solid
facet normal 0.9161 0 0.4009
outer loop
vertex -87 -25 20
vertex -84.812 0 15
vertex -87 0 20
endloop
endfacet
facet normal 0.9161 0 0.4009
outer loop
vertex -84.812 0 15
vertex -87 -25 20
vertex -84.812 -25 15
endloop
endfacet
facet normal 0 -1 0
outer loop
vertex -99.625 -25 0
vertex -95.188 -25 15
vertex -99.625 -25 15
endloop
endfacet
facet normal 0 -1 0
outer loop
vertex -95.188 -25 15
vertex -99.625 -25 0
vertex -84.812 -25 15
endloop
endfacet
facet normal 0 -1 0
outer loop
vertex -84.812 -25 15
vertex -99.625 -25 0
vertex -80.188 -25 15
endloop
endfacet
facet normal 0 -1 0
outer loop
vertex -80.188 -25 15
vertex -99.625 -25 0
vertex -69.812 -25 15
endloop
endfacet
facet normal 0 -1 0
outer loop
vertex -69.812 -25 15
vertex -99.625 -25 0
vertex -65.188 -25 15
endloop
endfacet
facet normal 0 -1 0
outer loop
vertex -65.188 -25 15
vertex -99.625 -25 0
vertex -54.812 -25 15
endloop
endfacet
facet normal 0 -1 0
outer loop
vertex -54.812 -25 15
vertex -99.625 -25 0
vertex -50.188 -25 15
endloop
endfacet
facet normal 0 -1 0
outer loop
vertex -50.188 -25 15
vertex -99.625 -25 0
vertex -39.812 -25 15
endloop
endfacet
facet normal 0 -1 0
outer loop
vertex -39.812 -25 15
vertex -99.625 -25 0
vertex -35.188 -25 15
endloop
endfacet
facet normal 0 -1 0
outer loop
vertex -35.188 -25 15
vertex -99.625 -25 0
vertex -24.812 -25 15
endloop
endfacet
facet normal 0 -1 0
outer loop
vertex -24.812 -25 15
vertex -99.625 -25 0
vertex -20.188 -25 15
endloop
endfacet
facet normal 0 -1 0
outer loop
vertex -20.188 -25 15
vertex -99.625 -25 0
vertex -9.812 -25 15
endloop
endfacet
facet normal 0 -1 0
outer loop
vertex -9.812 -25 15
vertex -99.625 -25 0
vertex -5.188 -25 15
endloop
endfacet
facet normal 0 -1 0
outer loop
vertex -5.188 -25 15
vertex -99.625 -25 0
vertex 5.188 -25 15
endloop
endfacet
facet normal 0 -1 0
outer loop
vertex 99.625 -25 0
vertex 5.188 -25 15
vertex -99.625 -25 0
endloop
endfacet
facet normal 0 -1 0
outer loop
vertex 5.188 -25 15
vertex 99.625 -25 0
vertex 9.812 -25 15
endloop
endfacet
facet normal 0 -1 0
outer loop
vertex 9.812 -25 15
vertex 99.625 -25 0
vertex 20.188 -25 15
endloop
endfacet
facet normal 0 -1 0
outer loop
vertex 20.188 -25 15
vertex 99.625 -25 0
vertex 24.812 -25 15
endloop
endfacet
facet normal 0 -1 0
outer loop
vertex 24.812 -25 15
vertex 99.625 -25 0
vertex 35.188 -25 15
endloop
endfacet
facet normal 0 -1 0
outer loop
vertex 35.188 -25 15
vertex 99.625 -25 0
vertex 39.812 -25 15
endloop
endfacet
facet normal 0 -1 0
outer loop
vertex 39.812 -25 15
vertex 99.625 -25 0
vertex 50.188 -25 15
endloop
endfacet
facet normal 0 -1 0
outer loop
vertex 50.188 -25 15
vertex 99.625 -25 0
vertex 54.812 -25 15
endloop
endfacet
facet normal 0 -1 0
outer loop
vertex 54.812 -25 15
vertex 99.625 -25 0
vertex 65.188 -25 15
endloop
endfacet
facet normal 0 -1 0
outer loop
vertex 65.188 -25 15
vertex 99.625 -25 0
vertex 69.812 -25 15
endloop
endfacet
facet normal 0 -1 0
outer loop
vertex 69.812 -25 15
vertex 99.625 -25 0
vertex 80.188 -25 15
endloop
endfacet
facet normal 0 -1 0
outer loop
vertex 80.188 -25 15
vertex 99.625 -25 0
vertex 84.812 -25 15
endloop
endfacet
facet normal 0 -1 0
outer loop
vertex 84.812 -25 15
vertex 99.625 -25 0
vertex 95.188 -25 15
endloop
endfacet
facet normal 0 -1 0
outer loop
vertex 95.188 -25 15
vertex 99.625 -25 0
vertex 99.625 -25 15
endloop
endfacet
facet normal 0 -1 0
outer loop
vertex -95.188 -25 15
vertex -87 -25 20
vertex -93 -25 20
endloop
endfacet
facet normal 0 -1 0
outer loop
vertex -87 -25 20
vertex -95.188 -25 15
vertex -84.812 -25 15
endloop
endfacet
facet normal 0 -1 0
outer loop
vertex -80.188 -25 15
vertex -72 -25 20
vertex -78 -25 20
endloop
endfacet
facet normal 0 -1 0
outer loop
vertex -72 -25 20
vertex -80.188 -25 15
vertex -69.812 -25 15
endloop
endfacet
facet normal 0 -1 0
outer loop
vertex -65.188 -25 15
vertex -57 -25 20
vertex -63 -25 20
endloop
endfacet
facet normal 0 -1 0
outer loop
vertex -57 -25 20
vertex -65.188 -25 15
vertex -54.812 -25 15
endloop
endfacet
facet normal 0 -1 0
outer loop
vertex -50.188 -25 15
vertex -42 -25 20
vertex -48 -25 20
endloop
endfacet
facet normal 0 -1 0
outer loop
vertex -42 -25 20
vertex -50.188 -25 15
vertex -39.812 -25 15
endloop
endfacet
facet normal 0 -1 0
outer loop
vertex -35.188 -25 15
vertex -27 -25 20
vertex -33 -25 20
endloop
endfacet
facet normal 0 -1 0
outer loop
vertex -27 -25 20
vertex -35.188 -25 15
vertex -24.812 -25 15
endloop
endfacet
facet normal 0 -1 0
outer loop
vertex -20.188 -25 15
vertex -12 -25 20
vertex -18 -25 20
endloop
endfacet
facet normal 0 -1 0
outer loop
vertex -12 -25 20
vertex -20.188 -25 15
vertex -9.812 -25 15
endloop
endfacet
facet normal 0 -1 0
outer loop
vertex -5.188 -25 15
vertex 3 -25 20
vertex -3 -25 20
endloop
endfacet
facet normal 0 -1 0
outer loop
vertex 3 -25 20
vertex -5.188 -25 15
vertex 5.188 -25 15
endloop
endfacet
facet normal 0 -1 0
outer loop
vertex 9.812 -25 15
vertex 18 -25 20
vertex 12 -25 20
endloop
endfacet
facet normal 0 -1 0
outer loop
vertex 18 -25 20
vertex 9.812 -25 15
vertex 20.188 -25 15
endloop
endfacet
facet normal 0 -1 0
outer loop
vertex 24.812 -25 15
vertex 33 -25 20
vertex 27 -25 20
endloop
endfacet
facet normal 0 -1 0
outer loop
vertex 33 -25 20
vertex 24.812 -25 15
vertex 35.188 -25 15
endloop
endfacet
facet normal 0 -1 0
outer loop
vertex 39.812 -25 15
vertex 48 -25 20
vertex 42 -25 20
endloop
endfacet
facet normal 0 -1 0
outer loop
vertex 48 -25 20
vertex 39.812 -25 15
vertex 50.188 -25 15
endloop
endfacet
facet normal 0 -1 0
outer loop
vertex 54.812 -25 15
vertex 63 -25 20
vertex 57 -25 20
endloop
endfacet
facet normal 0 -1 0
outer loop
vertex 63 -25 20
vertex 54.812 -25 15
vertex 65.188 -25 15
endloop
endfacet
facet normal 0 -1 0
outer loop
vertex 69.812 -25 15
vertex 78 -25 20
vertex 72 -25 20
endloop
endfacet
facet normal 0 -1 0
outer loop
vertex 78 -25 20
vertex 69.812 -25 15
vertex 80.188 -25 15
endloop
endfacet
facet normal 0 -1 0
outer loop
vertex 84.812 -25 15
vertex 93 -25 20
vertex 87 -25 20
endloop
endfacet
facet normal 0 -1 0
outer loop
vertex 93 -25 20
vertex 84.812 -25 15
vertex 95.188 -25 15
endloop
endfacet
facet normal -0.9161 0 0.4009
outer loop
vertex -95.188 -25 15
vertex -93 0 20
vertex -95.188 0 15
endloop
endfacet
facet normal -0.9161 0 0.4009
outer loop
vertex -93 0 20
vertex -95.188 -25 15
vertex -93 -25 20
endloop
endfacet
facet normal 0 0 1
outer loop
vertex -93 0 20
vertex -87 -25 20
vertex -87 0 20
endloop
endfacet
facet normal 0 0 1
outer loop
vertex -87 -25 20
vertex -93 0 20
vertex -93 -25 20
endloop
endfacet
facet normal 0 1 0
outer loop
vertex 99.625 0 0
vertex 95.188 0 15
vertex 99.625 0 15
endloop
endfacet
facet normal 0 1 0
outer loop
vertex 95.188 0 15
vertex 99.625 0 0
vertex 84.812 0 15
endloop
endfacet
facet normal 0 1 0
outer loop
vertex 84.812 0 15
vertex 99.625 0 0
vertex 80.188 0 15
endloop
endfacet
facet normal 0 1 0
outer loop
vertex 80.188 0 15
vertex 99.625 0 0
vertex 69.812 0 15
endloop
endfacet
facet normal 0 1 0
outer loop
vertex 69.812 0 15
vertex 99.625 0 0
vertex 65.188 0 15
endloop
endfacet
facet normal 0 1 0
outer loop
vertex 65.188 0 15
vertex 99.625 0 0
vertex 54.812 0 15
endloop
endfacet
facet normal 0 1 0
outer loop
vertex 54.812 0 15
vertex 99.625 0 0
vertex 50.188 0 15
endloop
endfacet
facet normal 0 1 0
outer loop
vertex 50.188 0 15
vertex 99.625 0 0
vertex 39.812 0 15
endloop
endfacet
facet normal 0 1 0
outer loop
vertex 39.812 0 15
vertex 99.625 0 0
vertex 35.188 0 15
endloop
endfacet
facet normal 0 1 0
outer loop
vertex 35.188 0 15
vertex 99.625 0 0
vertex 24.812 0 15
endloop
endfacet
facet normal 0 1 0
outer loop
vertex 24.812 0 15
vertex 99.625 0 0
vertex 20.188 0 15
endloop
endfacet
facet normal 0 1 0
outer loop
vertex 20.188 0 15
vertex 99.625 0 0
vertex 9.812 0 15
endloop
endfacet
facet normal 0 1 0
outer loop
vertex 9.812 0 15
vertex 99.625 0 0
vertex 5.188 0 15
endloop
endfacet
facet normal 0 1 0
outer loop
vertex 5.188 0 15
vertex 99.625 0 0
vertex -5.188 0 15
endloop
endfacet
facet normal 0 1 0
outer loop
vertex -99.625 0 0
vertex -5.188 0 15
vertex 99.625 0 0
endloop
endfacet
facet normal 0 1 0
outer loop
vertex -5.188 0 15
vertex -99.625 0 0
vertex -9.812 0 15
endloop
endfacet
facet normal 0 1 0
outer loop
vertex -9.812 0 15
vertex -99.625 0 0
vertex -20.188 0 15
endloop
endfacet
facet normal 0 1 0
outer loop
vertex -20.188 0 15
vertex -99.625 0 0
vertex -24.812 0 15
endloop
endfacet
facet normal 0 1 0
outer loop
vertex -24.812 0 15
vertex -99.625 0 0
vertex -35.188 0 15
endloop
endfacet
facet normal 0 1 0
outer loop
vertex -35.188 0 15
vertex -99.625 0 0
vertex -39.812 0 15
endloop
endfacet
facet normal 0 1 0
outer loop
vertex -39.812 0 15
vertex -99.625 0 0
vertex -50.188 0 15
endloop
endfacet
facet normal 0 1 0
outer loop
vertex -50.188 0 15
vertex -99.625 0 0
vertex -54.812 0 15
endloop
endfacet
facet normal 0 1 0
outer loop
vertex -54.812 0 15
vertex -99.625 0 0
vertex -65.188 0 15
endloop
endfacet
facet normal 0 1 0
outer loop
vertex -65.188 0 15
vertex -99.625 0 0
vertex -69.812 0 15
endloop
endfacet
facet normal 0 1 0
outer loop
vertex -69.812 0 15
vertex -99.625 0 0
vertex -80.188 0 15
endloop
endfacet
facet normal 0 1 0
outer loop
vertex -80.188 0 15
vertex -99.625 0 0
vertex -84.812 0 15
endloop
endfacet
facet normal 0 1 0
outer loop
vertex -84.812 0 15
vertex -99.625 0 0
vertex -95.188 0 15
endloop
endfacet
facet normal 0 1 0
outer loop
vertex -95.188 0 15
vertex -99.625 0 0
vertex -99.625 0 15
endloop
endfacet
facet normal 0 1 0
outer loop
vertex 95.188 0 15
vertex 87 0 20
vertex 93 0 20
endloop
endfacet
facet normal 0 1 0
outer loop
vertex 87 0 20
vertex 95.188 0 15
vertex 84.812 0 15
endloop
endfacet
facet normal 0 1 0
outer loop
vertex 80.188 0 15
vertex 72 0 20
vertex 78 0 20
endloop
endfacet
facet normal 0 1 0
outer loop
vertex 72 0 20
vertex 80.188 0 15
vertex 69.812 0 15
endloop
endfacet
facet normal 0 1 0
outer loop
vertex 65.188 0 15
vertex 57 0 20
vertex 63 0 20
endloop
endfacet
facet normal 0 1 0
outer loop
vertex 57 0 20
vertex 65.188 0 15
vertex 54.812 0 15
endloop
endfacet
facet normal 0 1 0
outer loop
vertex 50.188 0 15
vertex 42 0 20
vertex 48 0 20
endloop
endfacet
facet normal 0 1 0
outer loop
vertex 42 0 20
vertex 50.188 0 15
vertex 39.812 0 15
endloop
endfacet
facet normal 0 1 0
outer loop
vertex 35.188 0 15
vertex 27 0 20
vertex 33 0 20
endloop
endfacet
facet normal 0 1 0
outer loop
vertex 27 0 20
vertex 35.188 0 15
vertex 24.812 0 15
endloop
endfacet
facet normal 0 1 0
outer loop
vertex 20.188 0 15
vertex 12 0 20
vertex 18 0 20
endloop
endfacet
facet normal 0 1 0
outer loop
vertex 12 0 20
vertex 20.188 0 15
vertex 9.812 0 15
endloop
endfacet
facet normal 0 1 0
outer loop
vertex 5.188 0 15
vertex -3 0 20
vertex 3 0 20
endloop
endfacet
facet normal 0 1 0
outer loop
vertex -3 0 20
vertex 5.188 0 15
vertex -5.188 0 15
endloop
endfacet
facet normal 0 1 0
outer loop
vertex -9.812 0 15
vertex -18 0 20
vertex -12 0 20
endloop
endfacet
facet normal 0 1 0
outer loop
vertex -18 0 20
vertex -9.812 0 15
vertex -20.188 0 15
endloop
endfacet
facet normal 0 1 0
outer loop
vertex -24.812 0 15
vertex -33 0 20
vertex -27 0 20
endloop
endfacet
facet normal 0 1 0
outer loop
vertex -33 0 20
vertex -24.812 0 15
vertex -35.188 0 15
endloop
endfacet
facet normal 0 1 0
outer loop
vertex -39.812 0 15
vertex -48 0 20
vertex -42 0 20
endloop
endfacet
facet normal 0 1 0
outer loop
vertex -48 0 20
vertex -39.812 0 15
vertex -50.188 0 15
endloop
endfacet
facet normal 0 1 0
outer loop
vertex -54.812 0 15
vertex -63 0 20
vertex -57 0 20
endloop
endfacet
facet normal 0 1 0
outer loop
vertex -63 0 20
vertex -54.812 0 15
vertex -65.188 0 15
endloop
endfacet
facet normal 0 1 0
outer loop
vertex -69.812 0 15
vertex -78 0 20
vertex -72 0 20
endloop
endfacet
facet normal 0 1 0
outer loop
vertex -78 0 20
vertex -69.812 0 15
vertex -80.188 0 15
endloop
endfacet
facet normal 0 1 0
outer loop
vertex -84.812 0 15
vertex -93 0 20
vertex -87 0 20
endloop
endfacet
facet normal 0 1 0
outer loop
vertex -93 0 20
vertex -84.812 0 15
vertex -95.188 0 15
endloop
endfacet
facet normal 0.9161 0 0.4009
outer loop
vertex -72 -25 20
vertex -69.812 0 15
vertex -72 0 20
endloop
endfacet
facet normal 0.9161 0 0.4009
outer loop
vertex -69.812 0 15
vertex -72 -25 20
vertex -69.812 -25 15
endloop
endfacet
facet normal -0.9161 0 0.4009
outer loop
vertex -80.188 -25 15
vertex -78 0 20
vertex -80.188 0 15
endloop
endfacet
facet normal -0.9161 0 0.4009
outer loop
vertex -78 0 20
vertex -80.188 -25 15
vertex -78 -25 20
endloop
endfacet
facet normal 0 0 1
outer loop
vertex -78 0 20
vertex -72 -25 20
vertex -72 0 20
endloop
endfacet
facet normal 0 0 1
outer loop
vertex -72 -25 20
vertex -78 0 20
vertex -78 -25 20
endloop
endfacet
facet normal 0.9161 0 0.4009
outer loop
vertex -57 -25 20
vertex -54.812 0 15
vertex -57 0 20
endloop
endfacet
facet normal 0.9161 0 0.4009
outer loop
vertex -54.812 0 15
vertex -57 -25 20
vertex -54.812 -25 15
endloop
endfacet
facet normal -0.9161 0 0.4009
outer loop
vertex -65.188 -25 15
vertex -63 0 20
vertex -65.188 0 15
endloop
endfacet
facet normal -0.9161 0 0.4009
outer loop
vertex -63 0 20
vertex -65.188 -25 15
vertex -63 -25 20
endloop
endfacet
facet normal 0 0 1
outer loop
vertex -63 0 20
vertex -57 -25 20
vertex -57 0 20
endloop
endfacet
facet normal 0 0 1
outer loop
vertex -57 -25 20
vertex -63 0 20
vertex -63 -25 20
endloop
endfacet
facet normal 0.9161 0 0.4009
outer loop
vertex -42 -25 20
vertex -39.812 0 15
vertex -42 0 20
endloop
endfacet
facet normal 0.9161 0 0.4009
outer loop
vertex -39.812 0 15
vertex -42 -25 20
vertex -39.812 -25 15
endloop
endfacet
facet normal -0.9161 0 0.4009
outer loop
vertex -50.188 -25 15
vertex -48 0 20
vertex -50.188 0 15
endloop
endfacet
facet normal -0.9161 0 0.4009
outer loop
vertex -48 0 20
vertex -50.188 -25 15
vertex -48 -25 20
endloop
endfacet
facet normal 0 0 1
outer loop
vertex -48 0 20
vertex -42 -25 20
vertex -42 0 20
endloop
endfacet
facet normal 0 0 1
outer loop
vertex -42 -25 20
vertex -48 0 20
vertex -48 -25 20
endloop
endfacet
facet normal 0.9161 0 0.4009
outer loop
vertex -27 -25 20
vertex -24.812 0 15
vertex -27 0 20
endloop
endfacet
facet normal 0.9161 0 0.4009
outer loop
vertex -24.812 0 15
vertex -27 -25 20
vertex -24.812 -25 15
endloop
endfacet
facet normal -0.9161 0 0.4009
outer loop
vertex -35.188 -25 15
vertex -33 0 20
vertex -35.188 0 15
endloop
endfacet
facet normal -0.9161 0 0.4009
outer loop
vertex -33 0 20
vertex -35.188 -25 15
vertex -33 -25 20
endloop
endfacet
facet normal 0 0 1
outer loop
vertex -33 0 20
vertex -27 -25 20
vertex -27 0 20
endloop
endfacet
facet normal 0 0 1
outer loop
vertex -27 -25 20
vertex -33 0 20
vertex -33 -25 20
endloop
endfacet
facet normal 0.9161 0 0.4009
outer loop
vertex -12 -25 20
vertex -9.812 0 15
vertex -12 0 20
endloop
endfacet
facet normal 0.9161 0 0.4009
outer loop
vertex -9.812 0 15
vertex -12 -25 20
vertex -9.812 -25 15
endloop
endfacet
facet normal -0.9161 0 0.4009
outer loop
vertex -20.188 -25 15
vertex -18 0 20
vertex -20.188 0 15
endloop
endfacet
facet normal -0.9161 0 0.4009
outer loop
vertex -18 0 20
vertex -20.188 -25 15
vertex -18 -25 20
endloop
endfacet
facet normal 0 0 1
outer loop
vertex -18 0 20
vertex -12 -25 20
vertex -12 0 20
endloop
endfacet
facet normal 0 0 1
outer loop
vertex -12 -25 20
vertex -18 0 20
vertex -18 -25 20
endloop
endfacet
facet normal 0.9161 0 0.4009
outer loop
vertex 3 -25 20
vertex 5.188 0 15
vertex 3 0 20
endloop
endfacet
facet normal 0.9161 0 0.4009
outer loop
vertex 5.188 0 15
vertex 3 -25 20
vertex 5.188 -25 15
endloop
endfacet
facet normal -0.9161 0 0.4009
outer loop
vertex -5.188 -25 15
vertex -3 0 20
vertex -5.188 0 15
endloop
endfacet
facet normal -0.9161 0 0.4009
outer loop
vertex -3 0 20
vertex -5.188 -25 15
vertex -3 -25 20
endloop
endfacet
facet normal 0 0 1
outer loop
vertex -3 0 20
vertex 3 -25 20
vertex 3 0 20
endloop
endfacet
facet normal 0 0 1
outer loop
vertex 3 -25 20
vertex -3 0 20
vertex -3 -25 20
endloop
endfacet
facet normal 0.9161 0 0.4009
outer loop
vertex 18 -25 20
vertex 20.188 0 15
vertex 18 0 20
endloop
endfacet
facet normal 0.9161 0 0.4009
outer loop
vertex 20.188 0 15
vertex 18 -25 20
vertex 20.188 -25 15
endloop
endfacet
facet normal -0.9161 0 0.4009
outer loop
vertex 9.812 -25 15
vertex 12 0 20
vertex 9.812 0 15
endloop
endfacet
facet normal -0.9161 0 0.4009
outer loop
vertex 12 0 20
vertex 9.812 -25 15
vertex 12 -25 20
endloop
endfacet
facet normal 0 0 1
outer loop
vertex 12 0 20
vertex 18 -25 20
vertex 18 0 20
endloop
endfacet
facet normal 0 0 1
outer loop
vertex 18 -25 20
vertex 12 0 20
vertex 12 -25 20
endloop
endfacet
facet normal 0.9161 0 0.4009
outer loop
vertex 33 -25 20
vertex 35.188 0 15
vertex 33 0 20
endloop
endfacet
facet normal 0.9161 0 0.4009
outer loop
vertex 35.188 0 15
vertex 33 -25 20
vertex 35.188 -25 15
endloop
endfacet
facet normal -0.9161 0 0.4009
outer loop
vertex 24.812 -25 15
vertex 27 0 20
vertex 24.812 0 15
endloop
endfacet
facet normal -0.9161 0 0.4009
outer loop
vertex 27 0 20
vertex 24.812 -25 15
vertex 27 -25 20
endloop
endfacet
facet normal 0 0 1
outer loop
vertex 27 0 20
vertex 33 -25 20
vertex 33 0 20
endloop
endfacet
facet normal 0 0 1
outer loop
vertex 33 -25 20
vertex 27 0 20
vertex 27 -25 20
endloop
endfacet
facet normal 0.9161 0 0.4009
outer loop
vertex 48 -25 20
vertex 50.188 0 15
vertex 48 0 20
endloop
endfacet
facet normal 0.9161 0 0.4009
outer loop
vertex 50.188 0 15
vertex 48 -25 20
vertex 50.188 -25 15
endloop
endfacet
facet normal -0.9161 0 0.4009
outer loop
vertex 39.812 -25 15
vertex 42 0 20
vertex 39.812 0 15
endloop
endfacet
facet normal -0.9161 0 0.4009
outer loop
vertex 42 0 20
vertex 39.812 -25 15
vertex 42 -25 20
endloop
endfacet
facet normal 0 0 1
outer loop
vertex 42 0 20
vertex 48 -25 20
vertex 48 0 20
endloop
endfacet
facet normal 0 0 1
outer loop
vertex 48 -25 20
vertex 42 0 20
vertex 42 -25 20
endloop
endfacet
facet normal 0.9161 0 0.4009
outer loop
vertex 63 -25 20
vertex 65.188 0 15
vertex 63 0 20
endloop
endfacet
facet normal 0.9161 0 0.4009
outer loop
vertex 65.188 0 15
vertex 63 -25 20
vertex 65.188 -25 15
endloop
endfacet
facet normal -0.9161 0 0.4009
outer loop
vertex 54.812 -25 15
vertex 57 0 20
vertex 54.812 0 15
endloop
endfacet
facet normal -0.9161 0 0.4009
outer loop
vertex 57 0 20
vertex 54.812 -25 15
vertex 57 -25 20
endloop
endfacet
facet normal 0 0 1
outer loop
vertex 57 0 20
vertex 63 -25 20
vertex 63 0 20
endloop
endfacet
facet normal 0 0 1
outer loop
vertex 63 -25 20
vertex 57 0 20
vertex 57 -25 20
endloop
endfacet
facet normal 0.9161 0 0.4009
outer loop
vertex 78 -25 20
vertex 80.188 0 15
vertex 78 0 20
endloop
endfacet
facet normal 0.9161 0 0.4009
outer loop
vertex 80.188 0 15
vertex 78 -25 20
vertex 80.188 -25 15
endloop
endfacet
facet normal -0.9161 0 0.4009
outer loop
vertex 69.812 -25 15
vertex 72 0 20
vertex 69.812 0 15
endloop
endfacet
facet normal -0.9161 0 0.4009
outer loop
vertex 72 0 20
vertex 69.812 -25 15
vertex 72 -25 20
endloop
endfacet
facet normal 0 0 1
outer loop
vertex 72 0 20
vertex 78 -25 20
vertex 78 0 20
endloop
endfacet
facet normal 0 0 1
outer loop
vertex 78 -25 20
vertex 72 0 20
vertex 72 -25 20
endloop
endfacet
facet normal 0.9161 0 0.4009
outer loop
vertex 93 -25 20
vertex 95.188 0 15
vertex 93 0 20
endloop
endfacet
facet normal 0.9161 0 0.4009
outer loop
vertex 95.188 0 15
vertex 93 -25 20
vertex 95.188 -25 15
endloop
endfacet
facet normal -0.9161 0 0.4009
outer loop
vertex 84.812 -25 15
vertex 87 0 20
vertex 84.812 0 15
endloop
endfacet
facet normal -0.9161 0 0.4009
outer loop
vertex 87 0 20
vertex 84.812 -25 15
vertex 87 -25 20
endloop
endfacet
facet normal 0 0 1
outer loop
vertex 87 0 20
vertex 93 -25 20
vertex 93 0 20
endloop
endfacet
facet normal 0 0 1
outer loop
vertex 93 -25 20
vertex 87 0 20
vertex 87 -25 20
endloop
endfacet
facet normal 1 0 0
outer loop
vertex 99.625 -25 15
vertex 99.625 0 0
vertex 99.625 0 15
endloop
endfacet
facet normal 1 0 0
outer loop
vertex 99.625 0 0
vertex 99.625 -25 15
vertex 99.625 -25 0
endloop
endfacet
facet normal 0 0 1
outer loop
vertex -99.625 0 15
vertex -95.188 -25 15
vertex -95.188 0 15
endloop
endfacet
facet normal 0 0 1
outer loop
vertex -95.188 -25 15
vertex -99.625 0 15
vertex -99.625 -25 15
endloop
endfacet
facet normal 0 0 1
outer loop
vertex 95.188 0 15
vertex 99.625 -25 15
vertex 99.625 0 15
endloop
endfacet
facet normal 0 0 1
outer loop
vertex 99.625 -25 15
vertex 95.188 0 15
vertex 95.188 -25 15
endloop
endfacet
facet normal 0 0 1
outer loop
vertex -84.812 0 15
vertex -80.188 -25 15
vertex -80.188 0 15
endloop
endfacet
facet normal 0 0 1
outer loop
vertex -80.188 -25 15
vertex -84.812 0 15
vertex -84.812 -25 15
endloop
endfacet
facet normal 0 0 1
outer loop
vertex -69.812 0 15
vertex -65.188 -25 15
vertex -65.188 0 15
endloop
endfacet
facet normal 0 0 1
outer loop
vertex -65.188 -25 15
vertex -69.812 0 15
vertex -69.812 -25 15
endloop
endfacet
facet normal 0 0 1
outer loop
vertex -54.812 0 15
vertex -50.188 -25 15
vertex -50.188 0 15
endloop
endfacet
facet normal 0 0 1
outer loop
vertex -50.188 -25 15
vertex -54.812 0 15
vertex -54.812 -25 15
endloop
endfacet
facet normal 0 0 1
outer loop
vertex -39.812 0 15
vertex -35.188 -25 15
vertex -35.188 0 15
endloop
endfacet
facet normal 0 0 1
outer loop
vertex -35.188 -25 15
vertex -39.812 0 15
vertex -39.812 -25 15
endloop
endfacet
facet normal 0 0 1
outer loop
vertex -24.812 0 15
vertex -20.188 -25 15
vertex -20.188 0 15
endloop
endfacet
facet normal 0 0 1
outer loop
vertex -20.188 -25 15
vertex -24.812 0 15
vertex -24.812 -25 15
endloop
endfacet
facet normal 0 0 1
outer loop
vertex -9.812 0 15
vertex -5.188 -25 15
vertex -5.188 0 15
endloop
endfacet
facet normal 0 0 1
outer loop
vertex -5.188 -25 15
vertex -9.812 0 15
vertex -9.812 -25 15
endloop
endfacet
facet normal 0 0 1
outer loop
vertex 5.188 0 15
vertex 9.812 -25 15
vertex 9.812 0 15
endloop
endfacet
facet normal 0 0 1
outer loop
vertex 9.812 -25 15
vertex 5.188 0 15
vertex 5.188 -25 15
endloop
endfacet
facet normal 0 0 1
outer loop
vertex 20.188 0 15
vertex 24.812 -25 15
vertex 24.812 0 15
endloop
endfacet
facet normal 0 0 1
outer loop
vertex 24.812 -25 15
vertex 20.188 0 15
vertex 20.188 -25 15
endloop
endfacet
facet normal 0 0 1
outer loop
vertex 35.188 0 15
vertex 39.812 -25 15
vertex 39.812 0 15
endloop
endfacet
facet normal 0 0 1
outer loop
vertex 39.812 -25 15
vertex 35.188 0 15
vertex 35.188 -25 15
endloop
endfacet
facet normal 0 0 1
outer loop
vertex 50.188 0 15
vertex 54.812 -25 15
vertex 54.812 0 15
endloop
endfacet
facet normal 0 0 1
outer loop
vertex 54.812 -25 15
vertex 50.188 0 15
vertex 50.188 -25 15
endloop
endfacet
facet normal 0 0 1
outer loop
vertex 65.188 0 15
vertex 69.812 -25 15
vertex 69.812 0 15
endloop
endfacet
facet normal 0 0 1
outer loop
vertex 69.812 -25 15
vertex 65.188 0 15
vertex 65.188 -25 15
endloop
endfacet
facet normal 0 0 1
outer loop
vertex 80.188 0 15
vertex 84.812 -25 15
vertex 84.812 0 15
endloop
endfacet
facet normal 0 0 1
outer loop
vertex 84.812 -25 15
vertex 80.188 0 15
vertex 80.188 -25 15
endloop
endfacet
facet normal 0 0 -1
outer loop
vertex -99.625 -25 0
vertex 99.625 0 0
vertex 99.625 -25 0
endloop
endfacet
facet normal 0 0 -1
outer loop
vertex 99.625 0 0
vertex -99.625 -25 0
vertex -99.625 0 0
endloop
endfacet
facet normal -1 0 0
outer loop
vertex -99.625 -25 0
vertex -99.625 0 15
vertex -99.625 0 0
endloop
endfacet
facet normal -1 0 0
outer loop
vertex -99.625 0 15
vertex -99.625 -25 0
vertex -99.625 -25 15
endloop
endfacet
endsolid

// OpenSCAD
$fn = 32;

// ----------------------------------------------------------------------
// Toothed rack, 13 teeth
// 15 mm pitch, 5 mm teeth
// ----------------------------------------------------------------------

// --- parameters (mm) ---
bar_w = 25;      // bar width (Y)
bar_h = 15;      // bar height (Z)
teeth = 13;      // number of teeth
pitch = 15;      // tooth pitch
tooth_h = 5;     // tooth height above the bar
root_w = 11.25;  // tooth width at the root
crest_w = 6;     // tooth width at the crest

// --- derived feature positions (mm) ---
span = (teeth - 1) * pitch;  // = 180   distance between the outer teeth
bar_l = span + root_w + 8;   // = 199.25   bar length: teeth plus 4 mm at each end
tooth_x = -span / 2;         // = -90   X of the first tooth
height = bar_h + tooth_h;    // = 20   overall height
feature_centers = [
  [tooth_x + 0 * pitch, -bar_w / 2],
  [tooth_x + 1 * pitch, -bar_w / 2],
  [tooth_x + 2 * pitch, -bar_w / 2],
  [tooth_x + 3 * pitch, -bar_w / 2],
  [tooth_x + 4 * pitch, -bar_w / 2],
  [tooth_x + 5 * pitch, -bar_w / 2],
  [tooth_x + 6 * pitch, -bar_w / 2],
  [tooth_x + 7 * pitch, -bar_w / 2],
  [tooth_x + 8 * pitch, -bar_w / 2],
  [tooth_x + 9 * pitch, -bar_w / 2],
  [tooth_x + 10 * pitch, -bar_w / 2],
  [tooth_x + 11 * pitch, -bar_w / 2],
  [tooth_x + 12 * pitch, -bar_w / 2]
];   // tooth centre line, drives the tooth loop

// bar with a rack of teeth, one extruded trapezoium per centre
module rack_tooth() {
  linear_extrude(height = bar_w)
    polygon(points = [
      [0, 0],
      [root_w, 0],
      [root_w / 2 + crest_w / 2, tooth_h + 1],
      [root_w / 2 - crest_w / 2, tooth_h + 1]
    ]);
}

union() {
  translate([-bar_l / 2, -bar_w, 0]) cube([bar_l, bar_w, bar_h]);
  for (centre = feature_centers)
    translate([centre[0] - root_w / 2, 0, bar_h - 1]) rotate([90, 0, 0]) rack_tooth();
}
